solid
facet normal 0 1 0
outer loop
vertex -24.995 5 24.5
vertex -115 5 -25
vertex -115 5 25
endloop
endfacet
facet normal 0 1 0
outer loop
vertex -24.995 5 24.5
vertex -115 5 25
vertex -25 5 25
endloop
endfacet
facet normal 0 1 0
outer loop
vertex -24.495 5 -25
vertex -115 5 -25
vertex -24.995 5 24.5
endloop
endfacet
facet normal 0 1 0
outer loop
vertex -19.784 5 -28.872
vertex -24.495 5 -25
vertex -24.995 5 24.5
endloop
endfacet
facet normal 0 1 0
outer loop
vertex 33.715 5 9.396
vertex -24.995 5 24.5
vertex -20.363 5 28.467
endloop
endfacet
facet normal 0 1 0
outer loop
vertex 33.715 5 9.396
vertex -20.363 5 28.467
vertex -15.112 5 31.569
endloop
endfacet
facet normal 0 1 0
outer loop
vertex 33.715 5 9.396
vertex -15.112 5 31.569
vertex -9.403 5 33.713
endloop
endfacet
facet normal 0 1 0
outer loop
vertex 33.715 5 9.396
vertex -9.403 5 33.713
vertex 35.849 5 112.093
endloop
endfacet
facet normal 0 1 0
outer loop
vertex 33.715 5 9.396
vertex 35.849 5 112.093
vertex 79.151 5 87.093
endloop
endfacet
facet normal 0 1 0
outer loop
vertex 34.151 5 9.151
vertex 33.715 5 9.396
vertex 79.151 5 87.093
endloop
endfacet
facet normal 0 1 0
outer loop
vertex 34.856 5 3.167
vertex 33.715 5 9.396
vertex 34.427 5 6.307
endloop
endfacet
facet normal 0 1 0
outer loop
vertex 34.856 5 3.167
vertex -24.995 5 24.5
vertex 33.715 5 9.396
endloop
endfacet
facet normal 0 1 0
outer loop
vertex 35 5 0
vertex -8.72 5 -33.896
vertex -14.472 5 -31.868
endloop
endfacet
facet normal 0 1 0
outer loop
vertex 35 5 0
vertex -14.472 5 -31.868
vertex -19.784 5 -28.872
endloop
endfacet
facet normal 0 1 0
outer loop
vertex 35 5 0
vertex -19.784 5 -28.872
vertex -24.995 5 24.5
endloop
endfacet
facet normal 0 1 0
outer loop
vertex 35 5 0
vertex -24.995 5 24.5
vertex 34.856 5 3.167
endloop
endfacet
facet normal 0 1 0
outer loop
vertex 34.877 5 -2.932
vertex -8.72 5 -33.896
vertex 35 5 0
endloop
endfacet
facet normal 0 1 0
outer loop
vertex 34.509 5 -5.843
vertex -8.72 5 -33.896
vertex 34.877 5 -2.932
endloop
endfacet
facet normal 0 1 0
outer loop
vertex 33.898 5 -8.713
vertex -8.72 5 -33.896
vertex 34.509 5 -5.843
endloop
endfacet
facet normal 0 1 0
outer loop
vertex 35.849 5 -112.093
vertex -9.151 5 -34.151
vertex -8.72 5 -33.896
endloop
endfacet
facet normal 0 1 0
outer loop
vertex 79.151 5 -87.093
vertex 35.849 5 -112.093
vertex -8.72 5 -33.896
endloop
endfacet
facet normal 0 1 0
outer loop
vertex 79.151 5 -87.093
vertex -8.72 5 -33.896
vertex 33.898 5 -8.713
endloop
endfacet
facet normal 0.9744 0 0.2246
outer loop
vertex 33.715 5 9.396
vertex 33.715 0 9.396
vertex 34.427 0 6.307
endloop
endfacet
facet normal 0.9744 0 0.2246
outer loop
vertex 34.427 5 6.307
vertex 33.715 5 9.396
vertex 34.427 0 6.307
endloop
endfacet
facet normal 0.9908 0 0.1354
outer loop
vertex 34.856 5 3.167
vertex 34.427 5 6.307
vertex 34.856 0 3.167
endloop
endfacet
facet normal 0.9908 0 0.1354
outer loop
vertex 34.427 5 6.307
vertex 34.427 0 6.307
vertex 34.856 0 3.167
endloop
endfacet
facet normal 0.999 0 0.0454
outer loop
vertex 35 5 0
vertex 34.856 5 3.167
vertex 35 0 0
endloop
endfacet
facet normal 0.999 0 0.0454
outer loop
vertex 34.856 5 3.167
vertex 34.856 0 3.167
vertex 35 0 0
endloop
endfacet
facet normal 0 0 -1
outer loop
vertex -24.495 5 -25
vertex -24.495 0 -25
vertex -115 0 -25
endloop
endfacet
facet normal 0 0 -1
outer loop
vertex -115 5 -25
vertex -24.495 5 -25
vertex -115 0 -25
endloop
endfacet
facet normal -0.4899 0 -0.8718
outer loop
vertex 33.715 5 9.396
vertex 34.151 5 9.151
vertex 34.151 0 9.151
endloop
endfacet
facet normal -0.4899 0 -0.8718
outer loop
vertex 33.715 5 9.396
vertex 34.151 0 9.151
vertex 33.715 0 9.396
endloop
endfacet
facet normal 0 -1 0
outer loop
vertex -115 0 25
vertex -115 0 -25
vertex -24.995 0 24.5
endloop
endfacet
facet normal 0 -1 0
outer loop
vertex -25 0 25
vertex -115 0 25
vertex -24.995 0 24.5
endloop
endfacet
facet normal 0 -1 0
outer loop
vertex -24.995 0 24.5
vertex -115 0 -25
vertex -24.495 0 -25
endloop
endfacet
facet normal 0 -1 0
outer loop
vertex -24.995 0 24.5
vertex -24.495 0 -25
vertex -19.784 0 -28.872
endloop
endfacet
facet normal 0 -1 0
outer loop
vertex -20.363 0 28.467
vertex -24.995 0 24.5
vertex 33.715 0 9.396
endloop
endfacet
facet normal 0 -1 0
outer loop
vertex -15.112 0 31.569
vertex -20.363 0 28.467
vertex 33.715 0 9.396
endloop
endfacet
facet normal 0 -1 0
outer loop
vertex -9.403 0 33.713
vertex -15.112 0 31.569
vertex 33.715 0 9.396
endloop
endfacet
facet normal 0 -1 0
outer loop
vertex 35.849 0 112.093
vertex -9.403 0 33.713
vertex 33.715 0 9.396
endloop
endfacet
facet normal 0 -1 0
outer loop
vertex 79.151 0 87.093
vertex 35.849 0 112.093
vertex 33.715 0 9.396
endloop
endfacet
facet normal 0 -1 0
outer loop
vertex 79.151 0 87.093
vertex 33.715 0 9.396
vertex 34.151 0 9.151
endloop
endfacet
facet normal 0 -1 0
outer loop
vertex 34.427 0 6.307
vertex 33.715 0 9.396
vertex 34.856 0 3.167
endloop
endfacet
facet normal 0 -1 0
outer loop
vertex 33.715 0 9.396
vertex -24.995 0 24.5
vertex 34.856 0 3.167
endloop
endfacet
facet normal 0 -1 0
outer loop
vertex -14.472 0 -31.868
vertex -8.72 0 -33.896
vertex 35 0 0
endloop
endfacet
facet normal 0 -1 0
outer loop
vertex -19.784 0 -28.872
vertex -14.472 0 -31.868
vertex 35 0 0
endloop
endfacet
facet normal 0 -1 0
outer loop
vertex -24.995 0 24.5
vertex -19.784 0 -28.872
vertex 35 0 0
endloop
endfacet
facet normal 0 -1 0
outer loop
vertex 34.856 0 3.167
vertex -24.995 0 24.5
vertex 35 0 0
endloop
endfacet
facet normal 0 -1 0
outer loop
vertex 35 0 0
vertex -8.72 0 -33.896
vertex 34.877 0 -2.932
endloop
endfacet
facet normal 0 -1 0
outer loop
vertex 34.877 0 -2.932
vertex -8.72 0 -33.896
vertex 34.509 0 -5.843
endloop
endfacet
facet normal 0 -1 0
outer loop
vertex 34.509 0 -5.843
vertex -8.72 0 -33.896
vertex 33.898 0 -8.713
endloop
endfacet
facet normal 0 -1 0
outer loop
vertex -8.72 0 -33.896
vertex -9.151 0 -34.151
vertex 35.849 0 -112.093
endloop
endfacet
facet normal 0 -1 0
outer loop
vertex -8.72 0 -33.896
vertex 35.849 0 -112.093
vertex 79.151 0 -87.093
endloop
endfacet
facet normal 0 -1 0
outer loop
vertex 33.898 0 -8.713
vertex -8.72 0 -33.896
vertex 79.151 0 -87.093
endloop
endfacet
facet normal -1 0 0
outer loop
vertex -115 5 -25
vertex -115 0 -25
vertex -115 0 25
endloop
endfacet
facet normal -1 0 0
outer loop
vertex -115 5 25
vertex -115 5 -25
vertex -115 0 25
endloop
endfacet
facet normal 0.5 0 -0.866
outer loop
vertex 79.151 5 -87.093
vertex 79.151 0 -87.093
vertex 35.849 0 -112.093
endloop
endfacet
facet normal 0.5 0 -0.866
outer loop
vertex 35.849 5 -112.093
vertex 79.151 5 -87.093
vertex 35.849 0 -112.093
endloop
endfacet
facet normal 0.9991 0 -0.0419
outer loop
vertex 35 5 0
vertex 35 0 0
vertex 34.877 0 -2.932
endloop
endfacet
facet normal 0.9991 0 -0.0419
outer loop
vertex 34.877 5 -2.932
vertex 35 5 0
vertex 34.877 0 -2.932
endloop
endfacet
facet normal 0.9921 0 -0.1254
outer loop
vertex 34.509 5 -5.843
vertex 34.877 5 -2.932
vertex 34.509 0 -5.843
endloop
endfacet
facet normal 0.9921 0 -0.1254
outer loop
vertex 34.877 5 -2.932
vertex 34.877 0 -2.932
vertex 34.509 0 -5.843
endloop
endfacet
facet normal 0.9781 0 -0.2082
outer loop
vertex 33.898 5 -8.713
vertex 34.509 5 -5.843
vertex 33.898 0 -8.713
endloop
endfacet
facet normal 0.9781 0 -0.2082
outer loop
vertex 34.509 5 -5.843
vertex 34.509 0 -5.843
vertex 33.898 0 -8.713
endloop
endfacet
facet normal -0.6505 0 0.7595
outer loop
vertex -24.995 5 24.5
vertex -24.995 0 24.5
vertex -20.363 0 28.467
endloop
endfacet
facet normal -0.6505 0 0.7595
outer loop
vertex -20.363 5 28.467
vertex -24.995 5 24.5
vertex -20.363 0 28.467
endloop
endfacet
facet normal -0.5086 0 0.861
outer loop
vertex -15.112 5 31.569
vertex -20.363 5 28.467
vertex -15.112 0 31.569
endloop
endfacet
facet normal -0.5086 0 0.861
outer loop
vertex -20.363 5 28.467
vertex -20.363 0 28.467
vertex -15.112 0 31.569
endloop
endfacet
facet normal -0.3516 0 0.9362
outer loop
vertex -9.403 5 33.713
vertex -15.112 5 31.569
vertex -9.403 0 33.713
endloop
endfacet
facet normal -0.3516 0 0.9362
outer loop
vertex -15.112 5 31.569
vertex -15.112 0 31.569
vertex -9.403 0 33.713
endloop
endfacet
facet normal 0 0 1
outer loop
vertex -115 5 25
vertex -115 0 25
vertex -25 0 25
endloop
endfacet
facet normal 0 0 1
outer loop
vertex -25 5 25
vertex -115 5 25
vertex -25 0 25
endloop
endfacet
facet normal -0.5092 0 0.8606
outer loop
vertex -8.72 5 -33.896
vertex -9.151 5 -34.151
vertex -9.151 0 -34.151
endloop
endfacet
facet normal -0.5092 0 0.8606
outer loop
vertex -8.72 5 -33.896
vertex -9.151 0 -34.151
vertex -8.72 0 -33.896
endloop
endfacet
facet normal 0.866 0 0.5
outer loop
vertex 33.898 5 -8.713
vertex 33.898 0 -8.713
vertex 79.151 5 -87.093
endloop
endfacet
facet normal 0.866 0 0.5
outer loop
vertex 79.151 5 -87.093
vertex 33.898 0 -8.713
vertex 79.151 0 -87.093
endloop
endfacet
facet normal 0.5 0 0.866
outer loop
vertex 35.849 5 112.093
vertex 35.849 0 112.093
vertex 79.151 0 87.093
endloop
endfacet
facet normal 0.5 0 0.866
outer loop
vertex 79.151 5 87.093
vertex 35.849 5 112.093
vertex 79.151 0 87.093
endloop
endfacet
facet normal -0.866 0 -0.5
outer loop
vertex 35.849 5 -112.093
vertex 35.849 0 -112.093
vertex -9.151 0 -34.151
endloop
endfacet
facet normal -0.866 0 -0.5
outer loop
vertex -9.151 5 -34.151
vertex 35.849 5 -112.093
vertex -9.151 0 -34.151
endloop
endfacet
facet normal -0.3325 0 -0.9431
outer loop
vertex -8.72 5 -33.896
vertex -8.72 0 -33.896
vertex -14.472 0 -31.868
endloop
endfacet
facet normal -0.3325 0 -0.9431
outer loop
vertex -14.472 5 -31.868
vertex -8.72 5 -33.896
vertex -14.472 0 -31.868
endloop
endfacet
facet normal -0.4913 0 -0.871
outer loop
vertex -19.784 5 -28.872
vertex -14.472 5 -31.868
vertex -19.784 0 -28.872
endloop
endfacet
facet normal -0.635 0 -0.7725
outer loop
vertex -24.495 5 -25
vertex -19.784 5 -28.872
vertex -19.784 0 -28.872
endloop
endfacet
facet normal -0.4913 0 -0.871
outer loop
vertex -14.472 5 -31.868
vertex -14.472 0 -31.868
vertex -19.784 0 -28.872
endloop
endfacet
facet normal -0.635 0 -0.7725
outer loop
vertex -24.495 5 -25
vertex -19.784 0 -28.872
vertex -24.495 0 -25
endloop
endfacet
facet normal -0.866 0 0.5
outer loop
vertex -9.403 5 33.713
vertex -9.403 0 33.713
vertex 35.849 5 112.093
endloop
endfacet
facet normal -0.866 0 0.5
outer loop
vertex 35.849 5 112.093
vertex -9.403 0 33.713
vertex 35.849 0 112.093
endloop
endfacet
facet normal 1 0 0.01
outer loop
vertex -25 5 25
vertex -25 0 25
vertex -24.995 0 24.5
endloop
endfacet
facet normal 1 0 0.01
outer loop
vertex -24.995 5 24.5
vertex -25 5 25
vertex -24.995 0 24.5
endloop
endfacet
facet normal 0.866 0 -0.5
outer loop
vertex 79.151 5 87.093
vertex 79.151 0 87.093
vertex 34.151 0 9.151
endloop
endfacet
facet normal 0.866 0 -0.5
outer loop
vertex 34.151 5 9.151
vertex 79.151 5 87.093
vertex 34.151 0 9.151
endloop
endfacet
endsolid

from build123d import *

# Parameters (mm, degrees)
ESQUISSE3_R        = 35
BOSS_EXTRU_3_DEPTH = 5


with BuildPart() as part:
    # Esquisse3 → Boss.-Extru.3 (new body)
    with BuildSketch(Plane(origin=(0, 0, 0), x_dir=(1, 0, 0), z_dir=(0, 1, 0))):
        with BuildLine():
            Line((-115, -25), (-25, -25))
            Line((-25, -25), (-24.99494949, -24.500051021))
            ThreePointArc((-24.99494949, -24.500051021), (-34.998214236, 0.353553761), (-24.494897428, 25))
            Line((-24.494897428, 25), (-25, 25))
            Line((-25, 25), (-115, 25))
            Line((-115, 25), (-115, -25))
        make_face()
        Circle(ESQUISSE3_R)
        Polygon((-9.403186381, -33.713203436), (35.849364905, -112.092921435), (79.150635095, -87.092921435), (34.150635095, -9.150635095), align=None)
        with BuildLine():
            Line((-24.494897428, 25), (-24.99494949, -24.500051021))
            ThreePointArc((-24.99494949, -24.500051021), (-17.805293657, -30.132565736), (-9.403186381, -33.713203436))
            Line((-9.403186381, -33.713203436), (33.715141323, -9.396235714))
            ThreePointArc((33.715141323, -9.396235714), (34.677297662, -4.741837919), (35, 0))
            ThreePointArc((35, 0), (34.72342821, 4.391302011), (33.898083809, 8.713203436))
            Line((33.898083809, 8.713203436), (-8.720191833, 33.896286735))
            ThreePointArc((-8.720191833, 33.896286735), (-17.19292058, 30.486119496), (-24.494897428, 25))
        make_face()
        Circle(ESQUISSE3_R)
        Polygon((33.898083809, 8.713203436), (79.150635095, 87.092921435), (35.849364905, 112.092921435), (-9.150635095, 34.150635095), align=None)
        with BuildLine():
            ThreePointArc((33.898083809, 8.713203436), (17.805293657, 30.132565736), (-8.720191833, 33.896286735))
            Line((-8.720191833, 33.896286735), (33.898083809, 8.713203436))
        make_face()
    extrude(amount=BOSS_EXTRU_3_DEPTH)


solid = part.part
